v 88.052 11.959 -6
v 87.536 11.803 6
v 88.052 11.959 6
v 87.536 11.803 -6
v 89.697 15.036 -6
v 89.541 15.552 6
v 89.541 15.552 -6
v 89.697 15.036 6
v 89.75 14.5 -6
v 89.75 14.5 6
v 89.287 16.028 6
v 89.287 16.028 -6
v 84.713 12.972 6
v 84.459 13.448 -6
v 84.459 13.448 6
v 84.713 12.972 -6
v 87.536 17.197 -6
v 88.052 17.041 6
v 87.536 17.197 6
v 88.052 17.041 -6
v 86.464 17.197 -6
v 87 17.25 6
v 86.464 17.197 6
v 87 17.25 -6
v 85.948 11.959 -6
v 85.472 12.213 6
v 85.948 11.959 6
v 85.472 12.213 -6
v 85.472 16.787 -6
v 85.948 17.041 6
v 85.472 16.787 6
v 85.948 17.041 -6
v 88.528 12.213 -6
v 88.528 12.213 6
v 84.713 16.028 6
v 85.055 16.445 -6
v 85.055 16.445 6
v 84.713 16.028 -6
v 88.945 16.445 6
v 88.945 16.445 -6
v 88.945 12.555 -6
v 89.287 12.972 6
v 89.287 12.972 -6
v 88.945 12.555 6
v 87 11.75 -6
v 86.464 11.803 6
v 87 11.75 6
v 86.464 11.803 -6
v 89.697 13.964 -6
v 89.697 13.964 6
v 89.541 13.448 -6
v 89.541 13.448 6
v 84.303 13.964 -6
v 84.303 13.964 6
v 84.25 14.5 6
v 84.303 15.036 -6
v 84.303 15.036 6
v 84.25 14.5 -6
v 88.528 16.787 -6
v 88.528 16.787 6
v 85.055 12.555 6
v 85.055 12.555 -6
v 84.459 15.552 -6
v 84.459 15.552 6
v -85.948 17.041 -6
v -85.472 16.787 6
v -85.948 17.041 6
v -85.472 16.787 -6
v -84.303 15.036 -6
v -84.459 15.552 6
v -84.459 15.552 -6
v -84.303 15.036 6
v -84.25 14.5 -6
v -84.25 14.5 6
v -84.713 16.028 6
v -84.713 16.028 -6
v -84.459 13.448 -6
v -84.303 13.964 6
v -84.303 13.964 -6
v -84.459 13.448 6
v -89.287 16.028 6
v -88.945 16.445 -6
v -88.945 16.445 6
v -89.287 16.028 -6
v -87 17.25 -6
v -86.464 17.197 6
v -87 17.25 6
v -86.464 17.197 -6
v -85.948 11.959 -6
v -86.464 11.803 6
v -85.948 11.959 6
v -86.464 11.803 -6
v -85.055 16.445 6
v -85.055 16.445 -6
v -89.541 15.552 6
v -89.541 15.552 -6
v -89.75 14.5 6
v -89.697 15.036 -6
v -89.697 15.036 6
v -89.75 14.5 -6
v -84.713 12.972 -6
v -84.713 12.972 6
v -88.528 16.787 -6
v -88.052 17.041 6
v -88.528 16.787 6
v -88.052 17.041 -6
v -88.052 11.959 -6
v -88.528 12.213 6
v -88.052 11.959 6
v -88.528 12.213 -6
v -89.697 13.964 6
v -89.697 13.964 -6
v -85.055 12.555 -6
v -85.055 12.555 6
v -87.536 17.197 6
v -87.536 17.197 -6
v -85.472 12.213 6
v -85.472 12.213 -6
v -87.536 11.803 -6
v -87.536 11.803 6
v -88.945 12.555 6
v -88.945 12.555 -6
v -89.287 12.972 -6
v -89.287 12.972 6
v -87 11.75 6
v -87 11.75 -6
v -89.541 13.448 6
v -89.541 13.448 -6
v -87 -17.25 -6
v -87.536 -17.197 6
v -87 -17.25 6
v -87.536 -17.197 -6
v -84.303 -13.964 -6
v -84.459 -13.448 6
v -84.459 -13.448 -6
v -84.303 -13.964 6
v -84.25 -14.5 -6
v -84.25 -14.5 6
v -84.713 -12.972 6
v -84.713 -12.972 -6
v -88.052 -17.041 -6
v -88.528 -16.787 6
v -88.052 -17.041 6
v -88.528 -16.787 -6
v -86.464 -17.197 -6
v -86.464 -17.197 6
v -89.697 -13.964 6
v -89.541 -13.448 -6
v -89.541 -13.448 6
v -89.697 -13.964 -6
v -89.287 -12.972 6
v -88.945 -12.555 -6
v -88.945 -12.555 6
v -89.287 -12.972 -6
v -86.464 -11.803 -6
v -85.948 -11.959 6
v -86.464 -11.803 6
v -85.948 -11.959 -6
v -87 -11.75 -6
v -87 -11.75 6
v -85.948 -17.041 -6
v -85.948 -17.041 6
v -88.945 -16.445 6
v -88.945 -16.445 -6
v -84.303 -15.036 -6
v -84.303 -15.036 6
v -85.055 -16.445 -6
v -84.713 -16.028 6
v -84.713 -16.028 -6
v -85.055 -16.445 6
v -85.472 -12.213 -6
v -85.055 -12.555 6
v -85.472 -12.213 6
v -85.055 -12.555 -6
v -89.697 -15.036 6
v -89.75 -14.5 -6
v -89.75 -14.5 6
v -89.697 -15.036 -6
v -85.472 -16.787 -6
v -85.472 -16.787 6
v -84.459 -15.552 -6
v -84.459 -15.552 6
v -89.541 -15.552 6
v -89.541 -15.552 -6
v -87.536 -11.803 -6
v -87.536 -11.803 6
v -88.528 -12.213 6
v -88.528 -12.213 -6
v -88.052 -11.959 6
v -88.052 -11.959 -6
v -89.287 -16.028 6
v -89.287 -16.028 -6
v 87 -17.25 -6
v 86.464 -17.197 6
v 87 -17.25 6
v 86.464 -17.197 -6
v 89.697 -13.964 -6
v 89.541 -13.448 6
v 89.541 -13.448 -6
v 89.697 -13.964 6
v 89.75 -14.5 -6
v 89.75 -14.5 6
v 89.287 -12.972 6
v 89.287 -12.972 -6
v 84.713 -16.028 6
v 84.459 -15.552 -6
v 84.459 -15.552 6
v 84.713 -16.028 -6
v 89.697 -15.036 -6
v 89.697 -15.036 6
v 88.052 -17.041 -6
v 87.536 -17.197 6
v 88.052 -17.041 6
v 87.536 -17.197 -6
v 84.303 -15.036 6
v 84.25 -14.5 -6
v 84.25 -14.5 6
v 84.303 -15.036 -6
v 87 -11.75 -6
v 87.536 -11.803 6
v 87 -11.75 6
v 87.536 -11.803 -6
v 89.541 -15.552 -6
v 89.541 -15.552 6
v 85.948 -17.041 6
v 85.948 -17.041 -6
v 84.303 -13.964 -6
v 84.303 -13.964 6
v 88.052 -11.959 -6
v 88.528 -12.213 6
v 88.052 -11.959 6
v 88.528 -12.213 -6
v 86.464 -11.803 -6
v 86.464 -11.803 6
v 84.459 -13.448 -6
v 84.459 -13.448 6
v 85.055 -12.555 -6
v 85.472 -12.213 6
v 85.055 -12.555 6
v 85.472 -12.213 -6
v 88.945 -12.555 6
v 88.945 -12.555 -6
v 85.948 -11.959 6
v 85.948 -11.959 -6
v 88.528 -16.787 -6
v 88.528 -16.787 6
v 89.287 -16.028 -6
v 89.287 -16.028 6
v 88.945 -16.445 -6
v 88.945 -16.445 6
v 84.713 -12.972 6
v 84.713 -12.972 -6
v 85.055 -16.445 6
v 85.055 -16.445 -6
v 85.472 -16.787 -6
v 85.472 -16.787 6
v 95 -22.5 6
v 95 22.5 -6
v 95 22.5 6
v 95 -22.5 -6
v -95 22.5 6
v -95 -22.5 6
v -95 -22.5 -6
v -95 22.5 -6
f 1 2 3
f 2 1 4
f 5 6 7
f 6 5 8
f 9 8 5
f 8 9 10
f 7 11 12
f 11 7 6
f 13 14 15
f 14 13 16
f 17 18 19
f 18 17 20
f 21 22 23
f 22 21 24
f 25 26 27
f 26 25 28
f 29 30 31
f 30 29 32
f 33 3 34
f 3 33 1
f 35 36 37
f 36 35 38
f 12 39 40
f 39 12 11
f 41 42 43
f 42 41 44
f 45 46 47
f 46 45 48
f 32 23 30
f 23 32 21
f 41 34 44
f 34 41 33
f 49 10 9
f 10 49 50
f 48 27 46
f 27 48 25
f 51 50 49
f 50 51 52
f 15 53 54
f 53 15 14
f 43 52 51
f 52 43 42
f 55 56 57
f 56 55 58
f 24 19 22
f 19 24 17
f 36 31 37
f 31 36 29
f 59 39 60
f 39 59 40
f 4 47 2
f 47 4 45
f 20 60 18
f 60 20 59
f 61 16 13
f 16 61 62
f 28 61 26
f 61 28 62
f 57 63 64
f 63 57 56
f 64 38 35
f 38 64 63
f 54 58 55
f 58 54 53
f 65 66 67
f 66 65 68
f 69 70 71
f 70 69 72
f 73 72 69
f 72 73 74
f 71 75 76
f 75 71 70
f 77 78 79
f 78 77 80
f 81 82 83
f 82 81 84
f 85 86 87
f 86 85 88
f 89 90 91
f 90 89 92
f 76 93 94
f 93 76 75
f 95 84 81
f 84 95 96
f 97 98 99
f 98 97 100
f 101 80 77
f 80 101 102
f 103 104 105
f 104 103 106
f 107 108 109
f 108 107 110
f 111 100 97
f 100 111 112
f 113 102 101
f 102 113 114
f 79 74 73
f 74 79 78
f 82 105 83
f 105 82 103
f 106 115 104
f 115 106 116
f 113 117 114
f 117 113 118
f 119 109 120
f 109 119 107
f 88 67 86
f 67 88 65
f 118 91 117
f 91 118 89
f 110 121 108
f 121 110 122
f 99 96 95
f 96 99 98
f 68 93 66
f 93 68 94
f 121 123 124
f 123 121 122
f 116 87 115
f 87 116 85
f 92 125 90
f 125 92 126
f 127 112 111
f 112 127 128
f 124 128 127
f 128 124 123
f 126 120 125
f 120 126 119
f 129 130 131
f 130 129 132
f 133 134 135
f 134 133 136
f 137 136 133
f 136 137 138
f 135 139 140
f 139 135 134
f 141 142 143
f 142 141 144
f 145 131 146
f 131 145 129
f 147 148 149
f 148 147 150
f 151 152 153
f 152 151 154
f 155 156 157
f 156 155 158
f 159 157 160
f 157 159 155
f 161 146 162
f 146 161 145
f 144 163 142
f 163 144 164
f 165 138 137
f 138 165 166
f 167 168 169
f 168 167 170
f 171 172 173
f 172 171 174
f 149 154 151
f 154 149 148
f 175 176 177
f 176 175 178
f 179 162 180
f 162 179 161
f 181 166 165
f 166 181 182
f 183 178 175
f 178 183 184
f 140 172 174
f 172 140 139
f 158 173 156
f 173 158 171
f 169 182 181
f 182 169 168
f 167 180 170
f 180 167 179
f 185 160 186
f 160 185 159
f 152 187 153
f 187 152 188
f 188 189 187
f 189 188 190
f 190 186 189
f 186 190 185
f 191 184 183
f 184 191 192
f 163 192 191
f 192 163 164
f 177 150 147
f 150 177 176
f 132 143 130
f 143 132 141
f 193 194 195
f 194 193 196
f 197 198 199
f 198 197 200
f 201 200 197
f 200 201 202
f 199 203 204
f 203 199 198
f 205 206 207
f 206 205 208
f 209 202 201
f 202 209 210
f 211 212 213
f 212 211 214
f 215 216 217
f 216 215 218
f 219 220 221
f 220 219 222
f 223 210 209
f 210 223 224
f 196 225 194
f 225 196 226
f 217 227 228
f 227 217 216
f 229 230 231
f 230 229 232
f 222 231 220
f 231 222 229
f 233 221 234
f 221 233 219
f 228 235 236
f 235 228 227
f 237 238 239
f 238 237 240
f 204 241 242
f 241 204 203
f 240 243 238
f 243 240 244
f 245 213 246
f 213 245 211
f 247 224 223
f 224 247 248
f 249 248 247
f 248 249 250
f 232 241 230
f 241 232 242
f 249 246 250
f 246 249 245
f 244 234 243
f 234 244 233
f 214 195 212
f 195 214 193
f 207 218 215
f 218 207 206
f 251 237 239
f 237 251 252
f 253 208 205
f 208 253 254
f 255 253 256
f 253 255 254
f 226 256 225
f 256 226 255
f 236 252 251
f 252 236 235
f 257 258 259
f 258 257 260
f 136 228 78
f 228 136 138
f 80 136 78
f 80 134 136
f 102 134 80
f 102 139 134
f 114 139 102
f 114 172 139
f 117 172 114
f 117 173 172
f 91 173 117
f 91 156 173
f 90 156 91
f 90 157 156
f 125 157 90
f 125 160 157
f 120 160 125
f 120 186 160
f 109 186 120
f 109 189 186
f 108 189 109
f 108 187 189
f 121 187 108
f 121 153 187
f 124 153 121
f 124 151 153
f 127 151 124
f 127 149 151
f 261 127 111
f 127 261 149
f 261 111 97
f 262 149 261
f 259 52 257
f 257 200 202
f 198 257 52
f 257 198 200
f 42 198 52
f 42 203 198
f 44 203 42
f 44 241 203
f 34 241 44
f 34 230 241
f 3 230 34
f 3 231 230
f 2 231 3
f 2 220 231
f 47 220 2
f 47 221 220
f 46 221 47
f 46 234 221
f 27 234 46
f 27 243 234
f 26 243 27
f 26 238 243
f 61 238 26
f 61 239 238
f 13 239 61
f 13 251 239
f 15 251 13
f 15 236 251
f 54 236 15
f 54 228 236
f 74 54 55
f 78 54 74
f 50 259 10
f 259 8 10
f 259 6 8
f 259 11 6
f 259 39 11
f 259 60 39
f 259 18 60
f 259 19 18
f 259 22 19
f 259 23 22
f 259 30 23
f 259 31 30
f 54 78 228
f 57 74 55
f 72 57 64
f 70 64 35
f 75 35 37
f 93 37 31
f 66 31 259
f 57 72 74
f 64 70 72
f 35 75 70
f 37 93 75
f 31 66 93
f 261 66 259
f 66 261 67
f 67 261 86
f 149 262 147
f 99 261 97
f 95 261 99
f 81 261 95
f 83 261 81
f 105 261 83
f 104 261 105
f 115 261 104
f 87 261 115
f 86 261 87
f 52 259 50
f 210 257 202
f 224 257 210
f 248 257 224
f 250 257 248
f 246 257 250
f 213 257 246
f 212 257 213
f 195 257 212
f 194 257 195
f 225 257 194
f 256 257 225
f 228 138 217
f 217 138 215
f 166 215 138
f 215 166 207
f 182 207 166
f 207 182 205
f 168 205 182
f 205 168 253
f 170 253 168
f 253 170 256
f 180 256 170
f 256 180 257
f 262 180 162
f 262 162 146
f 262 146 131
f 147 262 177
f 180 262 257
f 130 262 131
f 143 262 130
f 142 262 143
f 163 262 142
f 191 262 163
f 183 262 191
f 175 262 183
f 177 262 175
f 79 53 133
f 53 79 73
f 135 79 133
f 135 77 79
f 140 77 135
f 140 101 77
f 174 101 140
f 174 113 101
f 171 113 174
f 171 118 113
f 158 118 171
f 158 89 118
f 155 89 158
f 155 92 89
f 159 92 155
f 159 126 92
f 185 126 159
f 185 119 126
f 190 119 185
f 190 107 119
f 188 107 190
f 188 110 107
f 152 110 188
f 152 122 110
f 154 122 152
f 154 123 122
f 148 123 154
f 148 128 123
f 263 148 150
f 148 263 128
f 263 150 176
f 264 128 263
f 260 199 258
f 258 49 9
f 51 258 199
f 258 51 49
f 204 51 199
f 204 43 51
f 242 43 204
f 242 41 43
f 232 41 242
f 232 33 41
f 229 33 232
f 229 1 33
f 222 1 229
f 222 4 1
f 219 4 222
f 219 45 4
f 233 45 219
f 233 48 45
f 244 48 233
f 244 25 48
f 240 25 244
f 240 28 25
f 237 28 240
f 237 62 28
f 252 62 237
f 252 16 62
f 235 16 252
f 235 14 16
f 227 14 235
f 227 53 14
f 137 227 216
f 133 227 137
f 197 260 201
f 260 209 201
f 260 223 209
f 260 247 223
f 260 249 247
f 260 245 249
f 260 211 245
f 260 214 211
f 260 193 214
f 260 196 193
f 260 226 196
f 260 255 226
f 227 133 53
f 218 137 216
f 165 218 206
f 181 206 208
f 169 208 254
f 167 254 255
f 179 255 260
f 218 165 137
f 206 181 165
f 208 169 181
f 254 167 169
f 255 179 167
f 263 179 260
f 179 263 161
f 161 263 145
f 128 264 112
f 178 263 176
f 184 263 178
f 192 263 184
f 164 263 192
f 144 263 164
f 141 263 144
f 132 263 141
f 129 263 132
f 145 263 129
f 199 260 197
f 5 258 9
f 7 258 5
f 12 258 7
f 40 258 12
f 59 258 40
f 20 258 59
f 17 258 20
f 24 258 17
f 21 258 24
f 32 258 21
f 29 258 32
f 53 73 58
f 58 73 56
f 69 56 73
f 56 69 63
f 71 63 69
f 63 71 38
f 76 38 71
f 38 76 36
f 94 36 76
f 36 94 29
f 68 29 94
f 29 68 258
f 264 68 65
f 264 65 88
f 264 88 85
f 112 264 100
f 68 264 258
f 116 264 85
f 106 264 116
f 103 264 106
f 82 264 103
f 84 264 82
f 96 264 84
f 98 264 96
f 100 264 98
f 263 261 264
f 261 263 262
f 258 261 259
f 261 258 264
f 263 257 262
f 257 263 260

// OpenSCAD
$fn = 32;

// ----------------------------------------------------------------------
// Corner plate 190 x 45 x 12
// 4 holes, centres taken from the edge offset
// ----------------------------------------------------------------------

// --- parameters (mm) ---
plate = [190, 45, 12];  // overall size (x, y, z)
holes = 4;              // number of holes the drawing asks for
hole_d = 5.5;           // hole diameter
edge = 8;               // hole centre offset from the plate edge

// --- derived feature positions (mm) ---
corner_x = plate[0] / 2 - edge;  // = 87   corner hole X
corner_y = plate[1] / 2 - edge;  // = 14.5   corner hole Y
feature_centers = [
  [corner_x, corner_y],
  [-corner_x, corner_y],
  [-corner_x, -corner_y],
  [corner_x, -corner_y]
];   // hole centres the loop below drills

// plate outline, every hole drilled through with the same cutters
difference() {
  cube(plate, center = true);
  for (centre = feature_centers)
    translate([centre[0], centre[1], 0])
      cylinder(d = hole_d, h = plate[2] + 2, center = true);
}
